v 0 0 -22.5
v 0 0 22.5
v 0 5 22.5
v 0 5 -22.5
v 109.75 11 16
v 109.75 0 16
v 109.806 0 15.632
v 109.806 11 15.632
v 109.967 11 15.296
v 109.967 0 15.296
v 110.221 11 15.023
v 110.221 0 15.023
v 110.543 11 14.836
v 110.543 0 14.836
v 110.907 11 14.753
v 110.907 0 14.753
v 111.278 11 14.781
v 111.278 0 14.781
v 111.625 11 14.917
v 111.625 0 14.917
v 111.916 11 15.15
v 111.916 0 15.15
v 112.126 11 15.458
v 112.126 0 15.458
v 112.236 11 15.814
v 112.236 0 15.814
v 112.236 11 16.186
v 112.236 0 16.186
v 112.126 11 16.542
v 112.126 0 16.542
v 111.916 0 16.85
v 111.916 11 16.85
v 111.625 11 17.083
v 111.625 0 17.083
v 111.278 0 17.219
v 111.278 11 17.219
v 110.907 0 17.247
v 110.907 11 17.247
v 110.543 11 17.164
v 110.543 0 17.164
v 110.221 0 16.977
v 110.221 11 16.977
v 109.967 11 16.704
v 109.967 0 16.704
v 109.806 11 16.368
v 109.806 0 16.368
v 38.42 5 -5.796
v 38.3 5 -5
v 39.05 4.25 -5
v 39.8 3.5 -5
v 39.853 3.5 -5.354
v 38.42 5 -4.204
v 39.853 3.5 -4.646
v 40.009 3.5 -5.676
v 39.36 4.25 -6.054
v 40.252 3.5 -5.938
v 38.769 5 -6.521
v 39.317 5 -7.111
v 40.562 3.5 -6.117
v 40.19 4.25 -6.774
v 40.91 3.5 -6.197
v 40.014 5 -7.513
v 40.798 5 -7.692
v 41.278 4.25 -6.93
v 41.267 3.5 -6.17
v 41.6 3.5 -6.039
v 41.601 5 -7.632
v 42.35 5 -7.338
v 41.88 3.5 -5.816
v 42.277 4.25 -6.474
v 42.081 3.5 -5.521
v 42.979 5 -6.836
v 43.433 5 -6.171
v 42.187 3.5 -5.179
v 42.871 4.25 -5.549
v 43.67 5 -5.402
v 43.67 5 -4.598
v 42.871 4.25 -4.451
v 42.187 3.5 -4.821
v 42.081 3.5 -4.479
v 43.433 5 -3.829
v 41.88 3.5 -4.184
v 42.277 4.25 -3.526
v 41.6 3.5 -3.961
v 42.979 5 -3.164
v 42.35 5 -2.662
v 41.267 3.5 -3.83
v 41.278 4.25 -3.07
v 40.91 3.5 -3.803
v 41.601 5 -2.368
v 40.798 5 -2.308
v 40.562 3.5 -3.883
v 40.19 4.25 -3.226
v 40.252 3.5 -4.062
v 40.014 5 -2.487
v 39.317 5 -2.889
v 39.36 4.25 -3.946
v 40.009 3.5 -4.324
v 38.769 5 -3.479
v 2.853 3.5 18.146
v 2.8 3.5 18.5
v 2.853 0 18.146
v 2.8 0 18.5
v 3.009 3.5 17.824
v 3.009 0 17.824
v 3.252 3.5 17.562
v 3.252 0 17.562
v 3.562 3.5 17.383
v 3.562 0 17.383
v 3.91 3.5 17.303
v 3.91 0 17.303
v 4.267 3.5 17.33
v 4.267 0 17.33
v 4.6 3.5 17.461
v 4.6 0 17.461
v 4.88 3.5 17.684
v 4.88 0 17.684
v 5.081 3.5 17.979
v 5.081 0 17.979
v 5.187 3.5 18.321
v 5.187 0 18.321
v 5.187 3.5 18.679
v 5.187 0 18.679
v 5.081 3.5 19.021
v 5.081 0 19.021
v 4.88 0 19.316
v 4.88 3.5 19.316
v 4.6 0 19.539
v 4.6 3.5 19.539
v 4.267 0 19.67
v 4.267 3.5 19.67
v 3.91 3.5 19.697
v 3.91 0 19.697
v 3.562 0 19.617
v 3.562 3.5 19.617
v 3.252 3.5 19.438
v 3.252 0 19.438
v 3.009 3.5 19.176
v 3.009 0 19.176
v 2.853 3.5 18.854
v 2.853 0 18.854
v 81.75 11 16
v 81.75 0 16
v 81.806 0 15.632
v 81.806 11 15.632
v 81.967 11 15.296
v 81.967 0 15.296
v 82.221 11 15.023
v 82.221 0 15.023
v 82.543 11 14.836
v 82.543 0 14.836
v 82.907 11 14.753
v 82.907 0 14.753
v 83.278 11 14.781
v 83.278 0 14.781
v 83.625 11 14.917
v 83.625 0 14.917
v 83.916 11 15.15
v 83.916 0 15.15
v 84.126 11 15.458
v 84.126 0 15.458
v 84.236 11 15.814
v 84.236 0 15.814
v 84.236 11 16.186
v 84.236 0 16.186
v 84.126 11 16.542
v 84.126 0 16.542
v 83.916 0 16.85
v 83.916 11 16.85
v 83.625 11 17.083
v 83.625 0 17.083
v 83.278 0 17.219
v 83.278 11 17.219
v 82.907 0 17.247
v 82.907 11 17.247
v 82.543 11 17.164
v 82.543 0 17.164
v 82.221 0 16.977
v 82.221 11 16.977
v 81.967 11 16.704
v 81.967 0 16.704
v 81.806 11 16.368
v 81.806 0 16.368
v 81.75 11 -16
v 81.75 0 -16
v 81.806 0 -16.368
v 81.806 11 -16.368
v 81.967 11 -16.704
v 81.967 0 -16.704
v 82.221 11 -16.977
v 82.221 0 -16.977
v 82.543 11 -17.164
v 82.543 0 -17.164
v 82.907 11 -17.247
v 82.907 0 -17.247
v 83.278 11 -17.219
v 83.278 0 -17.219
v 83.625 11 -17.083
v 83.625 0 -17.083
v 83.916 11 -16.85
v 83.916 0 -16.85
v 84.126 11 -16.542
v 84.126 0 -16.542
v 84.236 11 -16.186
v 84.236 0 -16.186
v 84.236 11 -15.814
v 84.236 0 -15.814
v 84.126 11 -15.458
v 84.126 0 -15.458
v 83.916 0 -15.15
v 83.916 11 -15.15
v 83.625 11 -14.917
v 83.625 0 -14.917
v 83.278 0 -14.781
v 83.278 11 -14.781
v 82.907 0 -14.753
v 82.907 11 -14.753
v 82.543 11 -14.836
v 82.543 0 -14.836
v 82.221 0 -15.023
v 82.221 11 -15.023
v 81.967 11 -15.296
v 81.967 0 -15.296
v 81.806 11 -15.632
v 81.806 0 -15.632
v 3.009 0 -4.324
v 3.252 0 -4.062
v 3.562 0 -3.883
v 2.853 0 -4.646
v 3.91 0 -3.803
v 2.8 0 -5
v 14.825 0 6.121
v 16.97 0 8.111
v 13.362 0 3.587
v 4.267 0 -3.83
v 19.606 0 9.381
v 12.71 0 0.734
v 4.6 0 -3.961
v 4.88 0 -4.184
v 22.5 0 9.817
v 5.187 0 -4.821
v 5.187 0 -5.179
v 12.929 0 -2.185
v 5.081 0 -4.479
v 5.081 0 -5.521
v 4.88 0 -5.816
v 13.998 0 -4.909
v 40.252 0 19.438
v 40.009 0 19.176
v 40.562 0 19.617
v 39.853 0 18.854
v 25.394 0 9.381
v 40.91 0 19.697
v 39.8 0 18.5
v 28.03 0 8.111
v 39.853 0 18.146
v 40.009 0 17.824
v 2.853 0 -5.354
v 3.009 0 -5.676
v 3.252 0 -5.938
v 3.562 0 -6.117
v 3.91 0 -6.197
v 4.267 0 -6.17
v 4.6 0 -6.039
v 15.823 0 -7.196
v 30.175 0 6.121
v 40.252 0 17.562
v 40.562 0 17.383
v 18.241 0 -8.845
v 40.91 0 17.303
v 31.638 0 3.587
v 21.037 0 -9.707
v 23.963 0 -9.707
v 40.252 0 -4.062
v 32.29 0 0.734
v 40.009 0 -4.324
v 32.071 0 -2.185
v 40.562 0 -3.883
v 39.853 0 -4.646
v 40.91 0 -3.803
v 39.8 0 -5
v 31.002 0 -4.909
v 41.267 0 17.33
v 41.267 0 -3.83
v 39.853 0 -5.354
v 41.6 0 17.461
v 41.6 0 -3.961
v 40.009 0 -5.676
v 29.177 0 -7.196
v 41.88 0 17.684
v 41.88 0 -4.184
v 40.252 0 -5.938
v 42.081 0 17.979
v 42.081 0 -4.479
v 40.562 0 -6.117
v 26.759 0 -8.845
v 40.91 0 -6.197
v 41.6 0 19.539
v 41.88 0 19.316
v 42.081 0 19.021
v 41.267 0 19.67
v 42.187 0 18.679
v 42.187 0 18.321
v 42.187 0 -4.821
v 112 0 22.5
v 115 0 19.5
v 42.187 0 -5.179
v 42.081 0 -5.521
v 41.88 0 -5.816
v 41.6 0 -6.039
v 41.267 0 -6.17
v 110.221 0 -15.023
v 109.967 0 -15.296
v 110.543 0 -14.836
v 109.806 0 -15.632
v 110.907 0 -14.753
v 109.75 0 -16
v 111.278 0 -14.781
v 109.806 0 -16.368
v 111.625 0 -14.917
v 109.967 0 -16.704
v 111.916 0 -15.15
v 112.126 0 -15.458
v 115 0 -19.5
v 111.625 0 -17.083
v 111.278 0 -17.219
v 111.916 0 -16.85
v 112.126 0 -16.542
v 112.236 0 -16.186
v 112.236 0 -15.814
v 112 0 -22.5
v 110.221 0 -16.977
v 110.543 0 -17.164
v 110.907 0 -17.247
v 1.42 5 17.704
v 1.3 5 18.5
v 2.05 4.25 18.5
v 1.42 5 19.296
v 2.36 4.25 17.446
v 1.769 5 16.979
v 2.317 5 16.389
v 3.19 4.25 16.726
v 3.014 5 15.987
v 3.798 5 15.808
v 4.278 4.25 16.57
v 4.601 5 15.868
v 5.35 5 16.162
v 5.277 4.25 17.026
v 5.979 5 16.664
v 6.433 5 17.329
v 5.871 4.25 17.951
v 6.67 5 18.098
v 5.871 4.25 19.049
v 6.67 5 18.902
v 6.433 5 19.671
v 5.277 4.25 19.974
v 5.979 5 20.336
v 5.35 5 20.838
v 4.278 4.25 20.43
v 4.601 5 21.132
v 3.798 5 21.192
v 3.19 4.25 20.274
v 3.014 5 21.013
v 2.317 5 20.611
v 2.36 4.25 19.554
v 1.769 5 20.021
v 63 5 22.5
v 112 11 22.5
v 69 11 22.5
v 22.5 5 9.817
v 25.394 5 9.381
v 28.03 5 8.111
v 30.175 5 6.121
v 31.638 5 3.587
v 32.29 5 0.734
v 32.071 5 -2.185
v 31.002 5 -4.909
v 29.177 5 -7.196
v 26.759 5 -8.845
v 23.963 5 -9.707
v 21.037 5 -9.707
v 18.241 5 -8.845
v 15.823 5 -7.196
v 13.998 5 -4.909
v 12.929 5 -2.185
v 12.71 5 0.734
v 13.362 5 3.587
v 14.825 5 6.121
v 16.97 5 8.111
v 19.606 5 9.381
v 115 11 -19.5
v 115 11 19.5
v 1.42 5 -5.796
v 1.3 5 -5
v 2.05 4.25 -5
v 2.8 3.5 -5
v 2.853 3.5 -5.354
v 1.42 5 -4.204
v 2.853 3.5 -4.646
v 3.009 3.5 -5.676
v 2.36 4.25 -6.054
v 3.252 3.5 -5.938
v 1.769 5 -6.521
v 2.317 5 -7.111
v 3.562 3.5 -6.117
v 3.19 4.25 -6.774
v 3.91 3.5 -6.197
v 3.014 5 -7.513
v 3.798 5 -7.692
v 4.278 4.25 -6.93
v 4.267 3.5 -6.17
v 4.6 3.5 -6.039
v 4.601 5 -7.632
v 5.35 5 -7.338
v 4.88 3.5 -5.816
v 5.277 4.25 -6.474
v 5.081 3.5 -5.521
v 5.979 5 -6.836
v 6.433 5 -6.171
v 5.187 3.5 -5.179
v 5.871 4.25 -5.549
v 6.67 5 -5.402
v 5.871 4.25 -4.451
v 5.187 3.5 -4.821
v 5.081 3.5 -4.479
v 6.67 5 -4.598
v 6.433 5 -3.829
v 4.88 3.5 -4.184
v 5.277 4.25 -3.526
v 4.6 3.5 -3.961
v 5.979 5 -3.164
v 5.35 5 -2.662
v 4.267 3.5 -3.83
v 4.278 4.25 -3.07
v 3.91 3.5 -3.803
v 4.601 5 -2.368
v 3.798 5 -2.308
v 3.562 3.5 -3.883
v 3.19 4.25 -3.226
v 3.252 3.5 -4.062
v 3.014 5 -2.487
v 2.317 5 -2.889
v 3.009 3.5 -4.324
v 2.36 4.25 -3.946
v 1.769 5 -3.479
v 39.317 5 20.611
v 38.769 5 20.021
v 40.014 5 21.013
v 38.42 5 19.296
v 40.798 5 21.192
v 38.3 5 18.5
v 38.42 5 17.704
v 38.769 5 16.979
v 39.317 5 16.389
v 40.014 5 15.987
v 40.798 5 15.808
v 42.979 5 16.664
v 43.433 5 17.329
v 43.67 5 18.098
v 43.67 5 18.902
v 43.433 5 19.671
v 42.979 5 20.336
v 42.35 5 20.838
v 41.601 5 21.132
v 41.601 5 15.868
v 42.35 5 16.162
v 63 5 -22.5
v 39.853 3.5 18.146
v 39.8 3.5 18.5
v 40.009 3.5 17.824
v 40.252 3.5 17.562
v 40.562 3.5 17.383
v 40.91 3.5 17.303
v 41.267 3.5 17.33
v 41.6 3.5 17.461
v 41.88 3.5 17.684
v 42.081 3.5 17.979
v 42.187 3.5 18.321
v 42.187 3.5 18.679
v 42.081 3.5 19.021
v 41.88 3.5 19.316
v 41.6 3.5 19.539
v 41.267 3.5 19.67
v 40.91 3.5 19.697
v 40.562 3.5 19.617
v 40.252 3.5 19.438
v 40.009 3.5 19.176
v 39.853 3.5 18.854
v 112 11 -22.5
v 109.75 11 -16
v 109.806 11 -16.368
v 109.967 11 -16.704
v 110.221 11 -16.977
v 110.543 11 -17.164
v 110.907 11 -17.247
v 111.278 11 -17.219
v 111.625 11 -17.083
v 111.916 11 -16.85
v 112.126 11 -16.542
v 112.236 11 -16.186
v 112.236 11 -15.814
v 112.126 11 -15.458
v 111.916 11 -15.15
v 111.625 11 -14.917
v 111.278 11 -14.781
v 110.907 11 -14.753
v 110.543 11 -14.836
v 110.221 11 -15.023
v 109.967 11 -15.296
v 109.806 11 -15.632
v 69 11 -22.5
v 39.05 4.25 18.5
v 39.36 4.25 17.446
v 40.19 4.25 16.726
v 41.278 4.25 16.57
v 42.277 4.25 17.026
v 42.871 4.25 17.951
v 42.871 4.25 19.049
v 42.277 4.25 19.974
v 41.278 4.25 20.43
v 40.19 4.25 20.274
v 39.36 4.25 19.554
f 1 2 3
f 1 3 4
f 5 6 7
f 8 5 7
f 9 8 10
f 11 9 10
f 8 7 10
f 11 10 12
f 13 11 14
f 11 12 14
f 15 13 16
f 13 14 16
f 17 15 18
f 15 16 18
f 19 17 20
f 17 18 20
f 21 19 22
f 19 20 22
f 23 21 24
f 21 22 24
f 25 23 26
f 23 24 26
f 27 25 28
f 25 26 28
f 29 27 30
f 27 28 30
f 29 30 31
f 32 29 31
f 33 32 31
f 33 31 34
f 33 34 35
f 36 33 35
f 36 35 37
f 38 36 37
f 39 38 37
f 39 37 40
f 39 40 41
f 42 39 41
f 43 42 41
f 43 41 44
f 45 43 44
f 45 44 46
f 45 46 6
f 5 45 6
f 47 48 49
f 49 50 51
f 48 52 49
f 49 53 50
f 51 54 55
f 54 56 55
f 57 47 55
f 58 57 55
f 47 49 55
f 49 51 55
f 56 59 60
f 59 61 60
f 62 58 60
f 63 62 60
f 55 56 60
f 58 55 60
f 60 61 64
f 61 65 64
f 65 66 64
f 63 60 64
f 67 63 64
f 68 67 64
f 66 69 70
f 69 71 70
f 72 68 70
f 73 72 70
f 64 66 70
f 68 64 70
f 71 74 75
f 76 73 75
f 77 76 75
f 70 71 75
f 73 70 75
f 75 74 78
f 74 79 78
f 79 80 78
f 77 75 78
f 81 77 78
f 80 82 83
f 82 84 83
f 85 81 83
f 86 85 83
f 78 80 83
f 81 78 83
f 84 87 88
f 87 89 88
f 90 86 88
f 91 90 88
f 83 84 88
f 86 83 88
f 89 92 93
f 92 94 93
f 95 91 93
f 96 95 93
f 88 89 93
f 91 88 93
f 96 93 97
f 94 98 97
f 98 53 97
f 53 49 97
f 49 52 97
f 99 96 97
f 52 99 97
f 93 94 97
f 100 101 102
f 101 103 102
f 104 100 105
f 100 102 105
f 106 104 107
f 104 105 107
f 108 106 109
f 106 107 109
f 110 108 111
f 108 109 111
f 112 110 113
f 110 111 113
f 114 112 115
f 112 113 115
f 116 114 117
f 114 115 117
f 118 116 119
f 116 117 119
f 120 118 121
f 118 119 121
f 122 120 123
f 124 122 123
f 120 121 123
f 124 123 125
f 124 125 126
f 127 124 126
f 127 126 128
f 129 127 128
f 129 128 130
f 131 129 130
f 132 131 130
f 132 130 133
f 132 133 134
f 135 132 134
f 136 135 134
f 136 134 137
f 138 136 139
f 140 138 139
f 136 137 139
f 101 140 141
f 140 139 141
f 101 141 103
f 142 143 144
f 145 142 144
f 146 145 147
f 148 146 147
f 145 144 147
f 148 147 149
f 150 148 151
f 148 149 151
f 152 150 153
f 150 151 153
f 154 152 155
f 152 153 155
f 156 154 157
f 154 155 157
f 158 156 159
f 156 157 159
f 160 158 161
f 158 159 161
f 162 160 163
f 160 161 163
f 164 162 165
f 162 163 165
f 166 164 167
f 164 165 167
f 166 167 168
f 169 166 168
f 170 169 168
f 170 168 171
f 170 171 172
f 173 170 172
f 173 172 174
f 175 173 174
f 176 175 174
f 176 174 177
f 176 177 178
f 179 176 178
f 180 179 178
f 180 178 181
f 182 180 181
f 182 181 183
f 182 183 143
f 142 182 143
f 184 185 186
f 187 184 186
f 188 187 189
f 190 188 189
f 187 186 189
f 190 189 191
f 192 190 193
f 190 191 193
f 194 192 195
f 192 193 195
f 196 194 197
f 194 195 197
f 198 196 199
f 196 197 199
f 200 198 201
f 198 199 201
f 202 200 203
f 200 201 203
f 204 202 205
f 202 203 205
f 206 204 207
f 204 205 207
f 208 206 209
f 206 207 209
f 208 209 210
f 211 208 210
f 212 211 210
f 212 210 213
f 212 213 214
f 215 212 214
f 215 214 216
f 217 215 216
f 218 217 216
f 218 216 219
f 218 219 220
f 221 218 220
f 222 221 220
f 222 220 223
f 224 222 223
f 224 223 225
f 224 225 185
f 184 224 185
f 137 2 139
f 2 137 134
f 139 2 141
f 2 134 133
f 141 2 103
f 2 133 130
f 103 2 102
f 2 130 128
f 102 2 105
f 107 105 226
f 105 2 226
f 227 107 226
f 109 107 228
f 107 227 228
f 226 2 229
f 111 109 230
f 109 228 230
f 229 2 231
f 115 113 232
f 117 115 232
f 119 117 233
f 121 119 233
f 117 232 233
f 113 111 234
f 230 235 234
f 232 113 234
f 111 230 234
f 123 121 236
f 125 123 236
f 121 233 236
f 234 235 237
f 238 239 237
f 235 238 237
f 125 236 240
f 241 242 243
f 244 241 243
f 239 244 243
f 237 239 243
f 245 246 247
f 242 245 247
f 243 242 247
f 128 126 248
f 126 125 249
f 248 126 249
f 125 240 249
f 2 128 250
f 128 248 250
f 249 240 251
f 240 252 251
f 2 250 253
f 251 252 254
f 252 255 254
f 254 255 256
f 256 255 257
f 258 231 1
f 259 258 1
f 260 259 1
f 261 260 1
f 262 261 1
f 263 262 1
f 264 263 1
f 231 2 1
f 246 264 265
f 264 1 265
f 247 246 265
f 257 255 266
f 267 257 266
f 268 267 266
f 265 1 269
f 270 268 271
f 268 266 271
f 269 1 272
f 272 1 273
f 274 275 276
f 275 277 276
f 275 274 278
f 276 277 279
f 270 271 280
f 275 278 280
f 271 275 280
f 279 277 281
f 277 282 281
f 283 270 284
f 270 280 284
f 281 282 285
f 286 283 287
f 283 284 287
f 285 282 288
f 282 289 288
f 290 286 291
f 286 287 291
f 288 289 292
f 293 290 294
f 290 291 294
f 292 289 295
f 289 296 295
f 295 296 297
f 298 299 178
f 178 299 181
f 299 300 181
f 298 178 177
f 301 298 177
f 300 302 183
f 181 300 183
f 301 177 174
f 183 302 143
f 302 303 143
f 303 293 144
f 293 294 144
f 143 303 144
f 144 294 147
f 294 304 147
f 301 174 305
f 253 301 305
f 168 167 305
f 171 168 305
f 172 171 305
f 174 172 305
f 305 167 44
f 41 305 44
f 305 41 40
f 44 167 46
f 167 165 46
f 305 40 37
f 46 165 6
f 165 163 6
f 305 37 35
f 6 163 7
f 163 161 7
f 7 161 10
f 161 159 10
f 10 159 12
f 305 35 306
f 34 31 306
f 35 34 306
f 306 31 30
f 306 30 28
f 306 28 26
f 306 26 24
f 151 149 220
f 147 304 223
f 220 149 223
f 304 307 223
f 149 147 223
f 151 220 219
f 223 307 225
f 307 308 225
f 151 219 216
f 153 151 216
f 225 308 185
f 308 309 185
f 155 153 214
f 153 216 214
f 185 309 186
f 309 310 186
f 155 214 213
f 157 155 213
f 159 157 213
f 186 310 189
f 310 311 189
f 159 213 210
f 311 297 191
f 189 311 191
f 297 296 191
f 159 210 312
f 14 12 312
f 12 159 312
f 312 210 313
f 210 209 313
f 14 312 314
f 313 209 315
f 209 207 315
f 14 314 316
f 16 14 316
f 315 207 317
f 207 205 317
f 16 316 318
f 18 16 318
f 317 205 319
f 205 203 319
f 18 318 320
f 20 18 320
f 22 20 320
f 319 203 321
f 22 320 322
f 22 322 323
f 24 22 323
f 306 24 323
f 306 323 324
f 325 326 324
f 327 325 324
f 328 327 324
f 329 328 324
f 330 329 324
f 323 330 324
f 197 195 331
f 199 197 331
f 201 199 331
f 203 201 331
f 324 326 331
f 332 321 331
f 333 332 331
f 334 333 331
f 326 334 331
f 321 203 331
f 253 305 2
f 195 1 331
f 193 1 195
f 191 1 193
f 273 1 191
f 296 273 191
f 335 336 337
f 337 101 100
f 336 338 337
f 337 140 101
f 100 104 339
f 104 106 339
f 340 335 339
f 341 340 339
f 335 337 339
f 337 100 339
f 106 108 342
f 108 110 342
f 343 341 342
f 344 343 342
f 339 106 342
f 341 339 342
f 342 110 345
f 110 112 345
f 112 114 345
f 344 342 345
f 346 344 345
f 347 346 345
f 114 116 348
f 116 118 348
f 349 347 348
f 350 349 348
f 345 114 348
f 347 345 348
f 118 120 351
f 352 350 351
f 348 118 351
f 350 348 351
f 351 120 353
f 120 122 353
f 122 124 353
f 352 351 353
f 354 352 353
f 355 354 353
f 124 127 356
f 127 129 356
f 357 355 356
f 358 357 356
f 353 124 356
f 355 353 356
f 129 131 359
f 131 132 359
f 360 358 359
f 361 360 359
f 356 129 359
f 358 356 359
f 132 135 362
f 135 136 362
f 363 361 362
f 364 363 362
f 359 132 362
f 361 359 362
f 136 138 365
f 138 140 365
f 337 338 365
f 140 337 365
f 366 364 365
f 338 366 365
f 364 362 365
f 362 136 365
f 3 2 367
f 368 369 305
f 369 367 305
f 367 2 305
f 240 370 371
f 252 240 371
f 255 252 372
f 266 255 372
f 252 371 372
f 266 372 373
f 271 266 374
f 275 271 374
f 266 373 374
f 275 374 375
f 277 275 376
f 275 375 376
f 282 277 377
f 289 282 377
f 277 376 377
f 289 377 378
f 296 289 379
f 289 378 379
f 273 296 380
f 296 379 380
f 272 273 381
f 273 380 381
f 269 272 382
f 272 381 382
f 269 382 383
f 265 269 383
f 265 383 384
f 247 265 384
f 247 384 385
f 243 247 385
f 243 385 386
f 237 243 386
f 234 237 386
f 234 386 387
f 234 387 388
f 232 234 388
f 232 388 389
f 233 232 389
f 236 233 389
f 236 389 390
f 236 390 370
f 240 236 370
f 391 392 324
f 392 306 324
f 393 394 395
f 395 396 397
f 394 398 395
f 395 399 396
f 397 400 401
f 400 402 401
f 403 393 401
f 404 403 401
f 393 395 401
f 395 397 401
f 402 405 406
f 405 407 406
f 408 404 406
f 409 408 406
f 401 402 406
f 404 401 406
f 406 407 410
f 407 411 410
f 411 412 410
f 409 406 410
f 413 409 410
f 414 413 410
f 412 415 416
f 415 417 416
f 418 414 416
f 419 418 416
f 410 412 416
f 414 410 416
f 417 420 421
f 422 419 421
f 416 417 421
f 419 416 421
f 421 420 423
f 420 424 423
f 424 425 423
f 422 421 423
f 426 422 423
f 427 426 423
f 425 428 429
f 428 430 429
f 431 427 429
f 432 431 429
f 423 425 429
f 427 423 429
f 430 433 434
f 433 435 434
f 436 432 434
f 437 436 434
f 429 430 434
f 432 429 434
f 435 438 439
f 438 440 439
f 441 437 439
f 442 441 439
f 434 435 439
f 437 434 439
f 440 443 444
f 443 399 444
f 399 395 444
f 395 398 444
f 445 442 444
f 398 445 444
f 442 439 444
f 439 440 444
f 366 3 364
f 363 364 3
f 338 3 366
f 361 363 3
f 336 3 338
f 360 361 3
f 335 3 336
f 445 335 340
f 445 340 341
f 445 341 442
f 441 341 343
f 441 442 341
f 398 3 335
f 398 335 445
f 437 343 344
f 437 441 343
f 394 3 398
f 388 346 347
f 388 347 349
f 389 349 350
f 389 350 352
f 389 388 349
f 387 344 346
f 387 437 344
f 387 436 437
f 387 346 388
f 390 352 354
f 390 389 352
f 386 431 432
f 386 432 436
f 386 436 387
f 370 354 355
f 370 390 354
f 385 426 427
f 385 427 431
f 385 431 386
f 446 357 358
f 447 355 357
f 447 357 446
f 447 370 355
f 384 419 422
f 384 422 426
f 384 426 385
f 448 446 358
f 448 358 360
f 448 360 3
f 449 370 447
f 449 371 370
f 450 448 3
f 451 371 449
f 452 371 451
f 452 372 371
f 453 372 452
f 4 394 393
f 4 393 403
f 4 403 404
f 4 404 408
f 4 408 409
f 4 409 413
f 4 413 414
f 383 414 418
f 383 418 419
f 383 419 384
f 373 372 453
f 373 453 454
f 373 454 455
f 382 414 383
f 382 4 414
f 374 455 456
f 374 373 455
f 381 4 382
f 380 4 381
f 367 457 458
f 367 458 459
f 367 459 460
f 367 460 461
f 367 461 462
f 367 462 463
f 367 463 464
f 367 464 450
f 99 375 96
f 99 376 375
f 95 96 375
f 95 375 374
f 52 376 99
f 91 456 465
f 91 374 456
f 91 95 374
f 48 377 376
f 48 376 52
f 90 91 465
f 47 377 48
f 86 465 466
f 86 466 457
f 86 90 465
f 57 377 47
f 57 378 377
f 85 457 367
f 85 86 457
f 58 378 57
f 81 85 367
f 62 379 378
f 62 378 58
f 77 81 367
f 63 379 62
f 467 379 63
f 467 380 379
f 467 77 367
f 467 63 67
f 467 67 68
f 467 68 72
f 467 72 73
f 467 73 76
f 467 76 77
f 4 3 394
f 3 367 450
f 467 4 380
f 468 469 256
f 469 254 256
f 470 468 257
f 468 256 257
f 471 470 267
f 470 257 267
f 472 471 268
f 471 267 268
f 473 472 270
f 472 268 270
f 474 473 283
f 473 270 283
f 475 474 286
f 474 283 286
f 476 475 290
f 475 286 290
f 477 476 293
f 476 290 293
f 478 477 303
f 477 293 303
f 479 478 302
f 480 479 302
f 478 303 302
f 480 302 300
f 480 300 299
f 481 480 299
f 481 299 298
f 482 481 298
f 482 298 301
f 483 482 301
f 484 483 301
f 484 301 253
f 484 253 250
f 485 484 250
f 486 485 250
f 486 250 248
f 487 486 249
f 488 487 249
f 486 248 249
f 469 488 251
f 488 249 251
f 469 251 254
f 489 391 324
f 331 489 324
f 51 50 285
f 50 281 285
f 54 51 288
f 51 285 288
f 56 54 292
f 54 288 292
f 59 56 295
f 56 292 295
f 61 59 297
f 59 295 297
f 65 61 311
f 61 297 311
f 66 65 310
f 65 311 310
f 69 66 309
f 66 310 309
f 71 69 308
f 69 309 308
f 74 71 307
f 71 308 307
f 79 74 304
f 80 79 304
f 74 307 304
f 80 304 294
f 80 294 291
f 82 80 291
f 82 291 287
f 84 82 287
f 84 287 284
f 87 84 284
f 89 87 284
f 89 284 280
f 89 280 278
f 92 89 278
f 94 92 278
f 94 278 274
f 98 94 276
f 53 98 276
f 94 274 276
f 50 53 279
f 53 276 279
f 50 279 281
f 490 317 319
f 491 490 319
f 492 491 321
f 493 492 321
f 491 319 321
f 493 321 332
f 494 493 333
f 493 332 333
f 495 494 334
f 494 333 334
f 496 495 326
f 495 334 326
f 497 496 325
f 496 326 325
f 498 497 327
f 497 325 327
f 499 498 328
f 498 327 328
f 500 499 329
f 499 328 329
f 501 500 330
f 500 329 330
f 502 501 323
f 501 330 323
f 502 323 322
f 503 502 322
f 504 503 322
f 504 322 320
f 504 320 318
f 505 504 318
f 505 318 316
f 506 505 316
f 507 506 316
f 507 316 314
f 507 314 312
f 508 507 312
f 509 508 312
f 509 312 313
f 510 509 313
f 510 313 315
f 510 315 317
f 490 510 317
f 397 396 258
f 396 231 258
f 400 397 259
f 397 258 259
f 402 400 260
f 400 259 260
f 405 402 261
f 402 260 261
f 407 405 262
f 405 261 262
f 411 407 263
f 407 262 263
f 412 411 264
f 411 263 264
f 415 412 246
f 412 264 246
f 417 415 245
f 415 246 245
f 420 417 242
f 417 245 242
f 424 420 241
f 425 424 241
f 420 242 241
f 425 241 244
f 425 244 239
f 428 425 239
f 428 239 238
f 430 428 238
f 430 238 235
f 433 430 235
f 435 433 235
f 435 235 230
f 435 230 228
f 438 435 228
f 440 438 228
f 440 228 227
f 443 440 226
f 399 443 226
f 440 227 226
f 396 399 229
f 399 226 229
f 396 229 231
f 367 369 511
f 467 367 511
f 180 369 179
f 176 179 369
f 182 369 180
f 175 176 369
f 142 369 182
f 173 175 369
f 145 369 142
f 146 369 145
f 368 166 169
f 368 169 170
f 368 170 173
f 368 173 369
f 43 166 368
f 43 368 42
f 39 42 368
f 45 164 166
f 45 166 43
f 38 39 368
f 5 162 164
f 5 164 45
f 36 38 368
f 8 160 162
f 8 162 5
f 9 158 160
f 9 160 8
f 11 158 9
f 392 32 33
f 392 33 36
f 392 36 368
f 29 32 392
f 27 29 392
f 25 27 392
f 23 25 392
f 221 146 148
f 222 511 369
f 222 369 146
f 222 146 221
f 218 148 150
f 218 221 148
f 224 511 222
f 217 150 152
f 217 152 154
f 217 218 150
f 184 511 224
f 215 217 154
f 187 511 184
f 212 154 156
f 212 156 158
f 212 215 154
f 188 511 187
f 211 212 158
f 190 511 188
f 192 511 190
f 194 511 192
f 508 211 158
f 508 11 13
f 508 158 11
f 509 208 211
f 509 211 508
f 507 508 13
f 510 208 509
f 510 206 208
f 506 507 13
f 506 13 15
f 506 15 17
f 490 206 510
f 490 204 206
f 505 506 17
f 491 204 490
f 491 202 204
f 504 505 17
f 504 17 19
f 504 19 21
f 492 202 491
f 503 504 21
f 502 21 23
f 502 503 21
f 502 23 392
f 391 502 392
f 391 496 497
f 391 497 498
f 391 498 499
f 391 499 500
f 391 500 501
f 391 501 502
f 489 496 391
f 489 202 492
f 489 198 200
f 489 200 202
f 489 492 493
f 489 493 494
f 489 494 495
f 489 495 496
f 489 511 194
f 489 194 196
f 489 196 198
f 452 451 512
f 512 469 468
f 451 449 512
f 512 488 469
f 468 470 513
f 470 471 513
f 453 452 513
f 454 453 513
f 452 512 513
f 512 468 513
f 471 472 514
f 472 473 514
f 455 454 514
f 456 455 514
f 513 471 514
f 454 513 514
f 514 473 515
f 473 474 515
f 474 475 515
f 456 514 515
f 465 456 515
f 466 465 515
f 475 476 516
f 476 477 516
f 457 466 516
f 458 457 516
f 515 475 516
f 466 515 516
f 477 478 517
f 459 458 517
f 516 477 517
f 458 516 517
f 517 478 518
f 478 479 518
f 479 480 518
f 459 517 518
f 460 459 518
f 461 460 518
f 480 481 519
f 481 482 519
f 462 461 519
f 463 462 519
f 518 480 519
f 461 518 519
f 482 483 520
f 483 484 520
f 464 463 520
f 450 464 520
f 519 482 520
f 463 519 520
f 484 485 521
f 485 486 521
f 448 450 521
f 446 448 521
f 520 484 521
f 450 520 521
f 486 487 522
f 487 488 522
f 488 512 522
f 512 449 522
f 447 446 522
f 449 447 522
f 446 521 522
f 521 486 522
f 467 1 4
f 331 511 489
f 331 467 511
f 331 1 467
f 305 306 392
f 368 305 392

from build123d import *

# Parameters (mm, degrees)
SKETCH1_W                                           = 115
SKETCH1_H                                           = 45
BOSS_EXTRUDE1_DEPTH                                 = 5
CUT_EXTRUDE1_REACH                                  = 119.287
SKETCH2_R                                           = 9.8171
CSK_FOR_M2_COUNTERSUNK_FLAT_HEAD_SCREW1_D           = 2.4
CSK_FOR_M2_COUNTERSUNK_FLAT_HEAD_SCREW1_CSINK_D     = 5.4
CSK_FOR_M2_COUNTERSUNK_FLAT_HEAD_SCREW1_CSINK_ANGLE = 90
SKETCH13_W                                          = 52
SKETCH13_H                                          = 45
BOSS_EXTRUDE4_DEPTH                                 = 6
CHAMFER2_SIZE                                       = 6
M3_TAPPED_HOLE1_D                                   = 2.5
CHAMFER1_SIZE                                       = 3


with BuildPart() as part:
    # Sketch1 → Boss-Extrude1 (new body)
    with BuildSketch(Plane(origin=(0, 0, 0), x_dir=(1, 0, 0), z_dir=(0, 1, 0))):
        with Locations((57.5, 0)):
            Rectangle(SKETCH1_W, SKETCH1_H)
    extrude(amount=BOSS_EXTRUDE1_DEPTH)

    # Sketch2 → Cut-Extrude1 (cut, up to next)
    with BuildSketch(Plane(origin=(0, 5, 0), x_dir=(1, 0, 0), z_dir=(0, 1, 0)), mode=Mode.PRIVATE) as cut_extrude1_sk1:
        with Locations(Location((22.5, 0, 0), (0, 0, 270))):
            Circle(SKETCH2_R)
    cut_extrude1_tool1 = extrude(cut_extrude1_sk1.sketch, amount=-CUT_EXTRUDE1_REACH, mode=Mode.PRIVATE) & part.part
    add(cut_extrude1_tool1.solids().sort_by_distance((22.5, 5, 0))[0], mode=Mode.SUBTRACT)

    # CSK for M2 Countersunk Flat Head Screw1 (through all)
    with Locations(Plane(origin=(0, 5, 0), x_dir=(1, 0, 0), z_dir=(0, 1, 0))):
        with Locations((4, -18.5), (41, -18.5), (41, 5), (4, 5)):
            CounterSinkHole(CSK_FOR_M2_COUNTERSUNK_FLAT_HEAD_SCREW1_D / 2, CSK_FOR_M2_COUNTERSUNK_FLAT_HEAD_SCREW1_CSINK_D / 2, counter_sink_angle=CSK_FOR_M2_COUNTERSUNK_FLAT_HEAD_SCREW1_CSINK_ANGLE)

    # Sketch13 → Boss-Extrude4 (add)
    with BuildSketch(Plane(origin=(0, 5, 0), x_dir=(1, 0, 0), z_dir=(0, 1, 0))):
        with Locations((89, 0)):
            Rectangle(SKETCH13_W, SKETCH13_H)
    extrude(amount=BOSS_EXTRUDE4_DEPTH)

    # Chamfer2
    chamfer2_edges = [part.edges().sort_by_distance(p)[0] for p in [
        (63, 11, 0),
    ]]
    chamfer(chamfer2_edges, length=CHAMFER2_SIZE - 0.0001)  # a hair under: the kernel refuses the full size

    # M3 Tapped Hole1 (through all)
    with Locations(Plane(origin=(0, 11, 0), x_dir=(1, 0, 0), z_dir=(0, 1, 0))):
        with Locations((83, 16), (111, 16), (83, -16), (111, -16)):
            Hole(M3_TAPPED_HOLE1_D / 2)

    # Chamfer1
    chamfer1_edges = [part.edges().sort_by_distance(p)[0] for p in [
        (115, 5.5, -22.5),
        (115, 5.5, 22.5),
    ]]
    chamfer(chamfer1_edges, length=CHAMFER1_SIZE)


solid = part.part
